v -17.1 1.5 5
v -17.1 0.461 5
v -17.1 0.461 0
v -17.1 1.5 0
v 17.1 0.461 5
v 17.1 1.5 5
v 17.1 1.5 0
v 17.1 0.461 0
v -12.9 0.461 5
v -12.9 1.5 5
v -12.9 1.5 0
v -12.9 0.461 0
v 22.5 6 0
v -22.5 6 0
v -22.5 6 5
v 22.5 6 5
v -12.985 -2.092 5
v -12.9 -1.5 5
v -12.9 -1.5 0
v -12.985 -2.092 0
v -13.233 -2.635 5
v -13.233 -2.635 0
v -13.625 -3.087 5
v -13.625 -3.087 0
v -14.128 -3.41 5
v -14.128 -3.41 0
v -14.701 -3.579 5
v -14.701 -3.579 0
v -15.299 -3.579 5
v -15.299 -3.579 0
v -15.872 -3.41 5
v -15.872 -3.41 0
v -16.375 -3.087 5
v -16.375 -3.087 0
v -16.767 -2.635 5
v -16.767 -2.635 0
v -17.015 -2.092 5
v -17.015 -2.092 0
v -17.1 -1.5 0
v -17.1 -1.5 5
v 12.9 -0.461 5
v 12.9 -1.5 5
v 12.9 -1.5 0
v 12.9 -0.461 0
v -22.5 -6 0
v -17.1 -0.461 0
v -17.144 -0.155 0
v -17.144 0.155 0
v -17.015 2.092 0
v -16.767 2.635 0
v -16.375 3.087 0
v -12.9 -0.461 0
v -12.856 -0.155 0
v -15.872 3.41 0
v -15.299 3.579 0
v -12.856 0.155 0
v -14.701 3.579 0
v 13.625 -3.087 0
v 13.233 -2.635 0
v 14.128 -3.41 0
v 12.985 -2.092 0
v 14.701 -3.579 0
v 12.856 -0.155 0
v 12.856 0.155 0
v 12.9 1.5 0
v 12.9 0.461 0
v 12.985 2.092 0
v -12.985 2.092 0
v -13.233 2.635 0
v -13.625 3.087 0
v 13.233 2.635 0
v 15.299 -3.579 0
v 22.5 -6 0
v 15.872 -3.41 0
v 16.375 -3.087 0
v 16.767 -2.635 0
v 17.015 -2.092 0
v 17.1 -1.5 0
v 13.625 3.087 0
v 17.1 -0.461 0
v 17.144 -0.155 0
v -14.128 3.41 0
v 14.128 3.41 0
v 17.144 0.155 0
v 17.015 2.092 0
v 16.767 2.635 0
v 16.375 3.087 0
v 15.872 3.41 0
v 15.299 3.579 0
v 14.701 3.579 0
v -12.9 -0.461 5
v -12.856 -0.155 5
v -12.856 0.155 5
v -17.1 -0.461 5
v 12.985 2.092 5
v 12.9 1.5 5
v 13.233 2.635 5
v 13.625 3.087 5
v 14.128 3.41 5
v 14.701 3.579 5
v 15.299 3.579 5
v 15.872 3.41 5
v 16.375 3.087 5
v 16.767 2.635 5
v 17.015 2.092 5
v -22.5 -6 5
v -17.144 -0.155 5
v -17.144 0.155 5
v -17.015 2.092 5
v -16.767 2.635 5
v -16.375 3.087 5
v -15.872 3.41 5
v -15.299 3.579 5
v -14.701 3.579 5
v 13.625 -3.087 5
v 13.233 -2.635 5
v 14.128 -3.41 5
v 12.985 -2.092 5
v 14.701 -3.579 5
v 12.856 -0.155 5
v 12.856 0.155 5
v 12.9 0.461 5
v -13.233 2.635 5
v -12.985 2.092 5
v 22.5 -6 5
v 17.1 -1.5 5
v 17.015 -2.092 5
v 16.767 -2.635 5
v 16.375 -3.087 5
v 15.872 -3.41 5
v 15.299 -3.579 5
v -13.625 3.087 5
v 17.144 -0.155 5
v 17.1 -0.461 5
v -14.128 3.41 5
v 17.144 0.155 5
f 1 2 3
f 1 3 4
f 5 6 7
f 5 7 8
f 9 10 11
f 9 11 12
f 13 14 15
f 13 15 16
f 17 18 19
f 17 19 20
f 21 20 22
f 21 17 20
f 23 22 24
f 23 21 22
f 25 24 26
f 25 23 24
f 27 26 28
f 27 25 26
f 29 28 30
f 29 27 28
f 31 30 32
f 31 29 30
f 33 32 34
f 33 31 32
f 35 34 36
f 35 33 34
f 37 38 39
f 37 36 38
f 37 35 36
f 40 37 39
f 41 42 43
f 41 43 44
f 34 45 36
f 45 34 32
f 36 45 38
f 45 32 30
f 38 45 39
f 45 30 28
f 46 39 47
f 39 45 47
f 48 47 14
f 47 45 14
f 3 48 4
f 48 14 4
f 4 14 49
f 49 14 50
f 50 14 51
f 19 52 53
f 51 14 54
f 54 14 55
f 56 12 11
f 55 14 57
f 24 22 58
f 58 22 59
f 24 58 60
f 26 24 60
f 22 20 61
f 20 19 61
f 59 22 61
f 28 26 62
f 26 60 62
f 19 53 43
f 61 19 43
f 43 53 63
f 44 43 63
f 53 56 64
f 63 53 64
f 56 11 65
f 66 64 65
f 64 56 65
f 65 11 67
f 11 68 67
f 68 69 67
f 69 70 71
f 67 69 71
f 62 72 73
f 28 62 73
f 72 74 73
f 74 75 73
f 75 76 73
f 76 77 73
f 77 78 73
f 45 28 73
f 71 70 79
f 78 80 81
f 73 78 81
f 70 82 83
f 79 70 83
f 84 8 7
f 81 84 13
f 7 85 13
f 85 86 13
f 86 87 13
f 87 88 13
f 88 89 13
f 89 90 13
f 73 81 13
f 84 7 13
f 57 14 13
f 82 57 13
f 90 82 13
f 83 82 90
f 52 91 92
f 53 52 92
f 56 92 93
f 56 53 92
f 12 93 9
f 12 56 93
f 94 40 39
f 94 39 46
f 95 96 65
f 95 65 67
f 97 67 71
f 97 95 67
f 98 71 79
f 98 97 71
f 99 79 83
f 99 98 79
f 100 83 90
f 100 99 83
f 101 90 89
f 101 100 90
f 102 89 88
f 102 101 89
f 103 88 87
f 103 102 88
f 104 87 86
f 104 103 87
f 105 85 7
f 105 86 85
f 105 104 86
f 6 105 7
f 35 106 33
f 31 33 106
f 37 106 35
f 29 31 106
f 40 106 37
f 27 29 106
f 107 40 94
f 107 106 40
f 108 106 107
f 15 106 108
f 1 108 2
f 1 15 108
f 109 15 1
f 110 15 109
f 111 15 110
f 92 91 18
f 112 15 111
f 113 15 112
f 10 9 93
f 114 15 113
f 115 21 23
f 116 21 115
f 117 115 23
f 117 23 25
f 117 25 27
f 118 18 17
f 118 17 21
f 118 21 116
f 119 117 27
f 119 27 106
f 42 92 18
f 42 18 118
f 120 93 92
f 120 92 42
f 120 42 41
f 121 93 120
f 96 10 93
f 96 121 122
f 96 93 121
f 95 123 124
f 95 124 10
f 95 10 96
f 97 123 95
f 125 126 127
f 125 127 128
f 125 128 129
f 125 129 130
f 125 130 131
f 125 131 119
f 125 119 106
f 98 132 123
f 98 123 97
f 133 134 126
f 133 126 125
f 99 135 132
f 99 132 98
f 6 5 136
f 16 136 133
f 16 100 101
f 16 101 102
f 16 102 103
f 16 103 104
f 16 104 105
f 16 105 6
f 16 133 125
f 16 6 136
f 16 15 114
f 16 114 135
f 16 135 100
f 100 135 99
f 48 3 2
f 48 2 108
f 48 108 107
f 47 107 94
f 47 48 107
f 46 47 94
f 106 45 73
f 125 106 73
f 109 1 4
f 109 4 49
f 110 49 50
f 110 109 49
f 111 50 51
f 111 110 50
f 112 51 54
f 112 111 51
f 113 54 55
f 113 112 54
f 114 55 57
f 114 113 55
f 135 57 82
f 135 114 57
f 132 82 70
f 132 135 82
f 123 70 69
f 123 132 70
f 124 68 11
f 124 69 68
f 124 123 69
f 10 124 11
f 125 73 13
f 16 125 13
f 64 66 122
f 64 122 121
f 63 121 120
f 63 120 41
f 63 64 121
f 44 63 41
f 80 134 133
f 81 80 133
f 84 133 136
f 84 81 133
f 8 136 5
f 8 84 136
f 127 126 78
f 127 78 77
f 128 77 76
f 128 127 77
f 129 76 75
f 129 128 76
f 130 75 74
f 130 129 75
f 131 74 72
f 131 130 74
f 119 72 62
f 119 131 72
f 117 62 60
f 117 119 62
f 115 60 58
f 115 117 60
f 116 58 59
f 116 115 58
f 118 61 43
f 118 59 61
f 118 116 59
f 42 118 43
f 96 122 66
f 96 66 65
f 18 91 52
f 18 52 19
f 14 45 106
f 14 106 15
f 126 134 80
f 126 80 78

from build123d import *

# Parameters (mm, degrees)
SKETCH1_W           = 45
SKETCH1_H           = 12
SKETCH1_R           = 2.15
BOSS_EXTRUDE1_DEPTH = 5
CUT_EXTRUDE1_DEPTH  = 24.817010728


with BuildPart() as part:
    # Sketch1 → Boss-Extrude1 (new body)
    with BuildSketch(Plane.XY):
        Rectangle(SKETCH1_W, SKETCH1_H)
        with Locations((-15, 0)):
            Circle(SKETCH1_R, mode=Mode.SUBTRACT)
        with Locations((15, 0)):
            Circle(SKETCH1_R, mode=Mode.SUBTRACT)
    extrude(amount=BOSS_EXTRUDE1_DEPTH)

    # Sketch2 → Cut-Extrude1 (cut, through all)
    with BuildSketch(Plane.XY.offset(5)):
        with BuildLine():
            Line((-12.9, 1.5), (-12.9, -1.5))
            ThreePointArc((-12.9, -1.5), (-15, -3.6), (-17.1, -1.5))
            Line((-17.1, -1.5), (-17.1, 1.5))
            ThreePointArc((-17.1, 1.5), (-15, 3.6), (-12.9, 1.5))
        make_face()
        with BuildLine():
            Line((12.9, -1.5), (12.9, 1.5))
            ThreePointArc((12.9, 1.5), (15, 3.6), (17.1, 1.5))
            Line((17.1, 1.5), (17.1, -1.5))
            ThreePointArc((17.1, -1.5), (15, -3.6), (12.9, -1.5))
        make_face()
    extrude(amount=-CUT_EXTRUDE1_DEPTH, mode=Mode.SUBTRACT)


solid = part.part
